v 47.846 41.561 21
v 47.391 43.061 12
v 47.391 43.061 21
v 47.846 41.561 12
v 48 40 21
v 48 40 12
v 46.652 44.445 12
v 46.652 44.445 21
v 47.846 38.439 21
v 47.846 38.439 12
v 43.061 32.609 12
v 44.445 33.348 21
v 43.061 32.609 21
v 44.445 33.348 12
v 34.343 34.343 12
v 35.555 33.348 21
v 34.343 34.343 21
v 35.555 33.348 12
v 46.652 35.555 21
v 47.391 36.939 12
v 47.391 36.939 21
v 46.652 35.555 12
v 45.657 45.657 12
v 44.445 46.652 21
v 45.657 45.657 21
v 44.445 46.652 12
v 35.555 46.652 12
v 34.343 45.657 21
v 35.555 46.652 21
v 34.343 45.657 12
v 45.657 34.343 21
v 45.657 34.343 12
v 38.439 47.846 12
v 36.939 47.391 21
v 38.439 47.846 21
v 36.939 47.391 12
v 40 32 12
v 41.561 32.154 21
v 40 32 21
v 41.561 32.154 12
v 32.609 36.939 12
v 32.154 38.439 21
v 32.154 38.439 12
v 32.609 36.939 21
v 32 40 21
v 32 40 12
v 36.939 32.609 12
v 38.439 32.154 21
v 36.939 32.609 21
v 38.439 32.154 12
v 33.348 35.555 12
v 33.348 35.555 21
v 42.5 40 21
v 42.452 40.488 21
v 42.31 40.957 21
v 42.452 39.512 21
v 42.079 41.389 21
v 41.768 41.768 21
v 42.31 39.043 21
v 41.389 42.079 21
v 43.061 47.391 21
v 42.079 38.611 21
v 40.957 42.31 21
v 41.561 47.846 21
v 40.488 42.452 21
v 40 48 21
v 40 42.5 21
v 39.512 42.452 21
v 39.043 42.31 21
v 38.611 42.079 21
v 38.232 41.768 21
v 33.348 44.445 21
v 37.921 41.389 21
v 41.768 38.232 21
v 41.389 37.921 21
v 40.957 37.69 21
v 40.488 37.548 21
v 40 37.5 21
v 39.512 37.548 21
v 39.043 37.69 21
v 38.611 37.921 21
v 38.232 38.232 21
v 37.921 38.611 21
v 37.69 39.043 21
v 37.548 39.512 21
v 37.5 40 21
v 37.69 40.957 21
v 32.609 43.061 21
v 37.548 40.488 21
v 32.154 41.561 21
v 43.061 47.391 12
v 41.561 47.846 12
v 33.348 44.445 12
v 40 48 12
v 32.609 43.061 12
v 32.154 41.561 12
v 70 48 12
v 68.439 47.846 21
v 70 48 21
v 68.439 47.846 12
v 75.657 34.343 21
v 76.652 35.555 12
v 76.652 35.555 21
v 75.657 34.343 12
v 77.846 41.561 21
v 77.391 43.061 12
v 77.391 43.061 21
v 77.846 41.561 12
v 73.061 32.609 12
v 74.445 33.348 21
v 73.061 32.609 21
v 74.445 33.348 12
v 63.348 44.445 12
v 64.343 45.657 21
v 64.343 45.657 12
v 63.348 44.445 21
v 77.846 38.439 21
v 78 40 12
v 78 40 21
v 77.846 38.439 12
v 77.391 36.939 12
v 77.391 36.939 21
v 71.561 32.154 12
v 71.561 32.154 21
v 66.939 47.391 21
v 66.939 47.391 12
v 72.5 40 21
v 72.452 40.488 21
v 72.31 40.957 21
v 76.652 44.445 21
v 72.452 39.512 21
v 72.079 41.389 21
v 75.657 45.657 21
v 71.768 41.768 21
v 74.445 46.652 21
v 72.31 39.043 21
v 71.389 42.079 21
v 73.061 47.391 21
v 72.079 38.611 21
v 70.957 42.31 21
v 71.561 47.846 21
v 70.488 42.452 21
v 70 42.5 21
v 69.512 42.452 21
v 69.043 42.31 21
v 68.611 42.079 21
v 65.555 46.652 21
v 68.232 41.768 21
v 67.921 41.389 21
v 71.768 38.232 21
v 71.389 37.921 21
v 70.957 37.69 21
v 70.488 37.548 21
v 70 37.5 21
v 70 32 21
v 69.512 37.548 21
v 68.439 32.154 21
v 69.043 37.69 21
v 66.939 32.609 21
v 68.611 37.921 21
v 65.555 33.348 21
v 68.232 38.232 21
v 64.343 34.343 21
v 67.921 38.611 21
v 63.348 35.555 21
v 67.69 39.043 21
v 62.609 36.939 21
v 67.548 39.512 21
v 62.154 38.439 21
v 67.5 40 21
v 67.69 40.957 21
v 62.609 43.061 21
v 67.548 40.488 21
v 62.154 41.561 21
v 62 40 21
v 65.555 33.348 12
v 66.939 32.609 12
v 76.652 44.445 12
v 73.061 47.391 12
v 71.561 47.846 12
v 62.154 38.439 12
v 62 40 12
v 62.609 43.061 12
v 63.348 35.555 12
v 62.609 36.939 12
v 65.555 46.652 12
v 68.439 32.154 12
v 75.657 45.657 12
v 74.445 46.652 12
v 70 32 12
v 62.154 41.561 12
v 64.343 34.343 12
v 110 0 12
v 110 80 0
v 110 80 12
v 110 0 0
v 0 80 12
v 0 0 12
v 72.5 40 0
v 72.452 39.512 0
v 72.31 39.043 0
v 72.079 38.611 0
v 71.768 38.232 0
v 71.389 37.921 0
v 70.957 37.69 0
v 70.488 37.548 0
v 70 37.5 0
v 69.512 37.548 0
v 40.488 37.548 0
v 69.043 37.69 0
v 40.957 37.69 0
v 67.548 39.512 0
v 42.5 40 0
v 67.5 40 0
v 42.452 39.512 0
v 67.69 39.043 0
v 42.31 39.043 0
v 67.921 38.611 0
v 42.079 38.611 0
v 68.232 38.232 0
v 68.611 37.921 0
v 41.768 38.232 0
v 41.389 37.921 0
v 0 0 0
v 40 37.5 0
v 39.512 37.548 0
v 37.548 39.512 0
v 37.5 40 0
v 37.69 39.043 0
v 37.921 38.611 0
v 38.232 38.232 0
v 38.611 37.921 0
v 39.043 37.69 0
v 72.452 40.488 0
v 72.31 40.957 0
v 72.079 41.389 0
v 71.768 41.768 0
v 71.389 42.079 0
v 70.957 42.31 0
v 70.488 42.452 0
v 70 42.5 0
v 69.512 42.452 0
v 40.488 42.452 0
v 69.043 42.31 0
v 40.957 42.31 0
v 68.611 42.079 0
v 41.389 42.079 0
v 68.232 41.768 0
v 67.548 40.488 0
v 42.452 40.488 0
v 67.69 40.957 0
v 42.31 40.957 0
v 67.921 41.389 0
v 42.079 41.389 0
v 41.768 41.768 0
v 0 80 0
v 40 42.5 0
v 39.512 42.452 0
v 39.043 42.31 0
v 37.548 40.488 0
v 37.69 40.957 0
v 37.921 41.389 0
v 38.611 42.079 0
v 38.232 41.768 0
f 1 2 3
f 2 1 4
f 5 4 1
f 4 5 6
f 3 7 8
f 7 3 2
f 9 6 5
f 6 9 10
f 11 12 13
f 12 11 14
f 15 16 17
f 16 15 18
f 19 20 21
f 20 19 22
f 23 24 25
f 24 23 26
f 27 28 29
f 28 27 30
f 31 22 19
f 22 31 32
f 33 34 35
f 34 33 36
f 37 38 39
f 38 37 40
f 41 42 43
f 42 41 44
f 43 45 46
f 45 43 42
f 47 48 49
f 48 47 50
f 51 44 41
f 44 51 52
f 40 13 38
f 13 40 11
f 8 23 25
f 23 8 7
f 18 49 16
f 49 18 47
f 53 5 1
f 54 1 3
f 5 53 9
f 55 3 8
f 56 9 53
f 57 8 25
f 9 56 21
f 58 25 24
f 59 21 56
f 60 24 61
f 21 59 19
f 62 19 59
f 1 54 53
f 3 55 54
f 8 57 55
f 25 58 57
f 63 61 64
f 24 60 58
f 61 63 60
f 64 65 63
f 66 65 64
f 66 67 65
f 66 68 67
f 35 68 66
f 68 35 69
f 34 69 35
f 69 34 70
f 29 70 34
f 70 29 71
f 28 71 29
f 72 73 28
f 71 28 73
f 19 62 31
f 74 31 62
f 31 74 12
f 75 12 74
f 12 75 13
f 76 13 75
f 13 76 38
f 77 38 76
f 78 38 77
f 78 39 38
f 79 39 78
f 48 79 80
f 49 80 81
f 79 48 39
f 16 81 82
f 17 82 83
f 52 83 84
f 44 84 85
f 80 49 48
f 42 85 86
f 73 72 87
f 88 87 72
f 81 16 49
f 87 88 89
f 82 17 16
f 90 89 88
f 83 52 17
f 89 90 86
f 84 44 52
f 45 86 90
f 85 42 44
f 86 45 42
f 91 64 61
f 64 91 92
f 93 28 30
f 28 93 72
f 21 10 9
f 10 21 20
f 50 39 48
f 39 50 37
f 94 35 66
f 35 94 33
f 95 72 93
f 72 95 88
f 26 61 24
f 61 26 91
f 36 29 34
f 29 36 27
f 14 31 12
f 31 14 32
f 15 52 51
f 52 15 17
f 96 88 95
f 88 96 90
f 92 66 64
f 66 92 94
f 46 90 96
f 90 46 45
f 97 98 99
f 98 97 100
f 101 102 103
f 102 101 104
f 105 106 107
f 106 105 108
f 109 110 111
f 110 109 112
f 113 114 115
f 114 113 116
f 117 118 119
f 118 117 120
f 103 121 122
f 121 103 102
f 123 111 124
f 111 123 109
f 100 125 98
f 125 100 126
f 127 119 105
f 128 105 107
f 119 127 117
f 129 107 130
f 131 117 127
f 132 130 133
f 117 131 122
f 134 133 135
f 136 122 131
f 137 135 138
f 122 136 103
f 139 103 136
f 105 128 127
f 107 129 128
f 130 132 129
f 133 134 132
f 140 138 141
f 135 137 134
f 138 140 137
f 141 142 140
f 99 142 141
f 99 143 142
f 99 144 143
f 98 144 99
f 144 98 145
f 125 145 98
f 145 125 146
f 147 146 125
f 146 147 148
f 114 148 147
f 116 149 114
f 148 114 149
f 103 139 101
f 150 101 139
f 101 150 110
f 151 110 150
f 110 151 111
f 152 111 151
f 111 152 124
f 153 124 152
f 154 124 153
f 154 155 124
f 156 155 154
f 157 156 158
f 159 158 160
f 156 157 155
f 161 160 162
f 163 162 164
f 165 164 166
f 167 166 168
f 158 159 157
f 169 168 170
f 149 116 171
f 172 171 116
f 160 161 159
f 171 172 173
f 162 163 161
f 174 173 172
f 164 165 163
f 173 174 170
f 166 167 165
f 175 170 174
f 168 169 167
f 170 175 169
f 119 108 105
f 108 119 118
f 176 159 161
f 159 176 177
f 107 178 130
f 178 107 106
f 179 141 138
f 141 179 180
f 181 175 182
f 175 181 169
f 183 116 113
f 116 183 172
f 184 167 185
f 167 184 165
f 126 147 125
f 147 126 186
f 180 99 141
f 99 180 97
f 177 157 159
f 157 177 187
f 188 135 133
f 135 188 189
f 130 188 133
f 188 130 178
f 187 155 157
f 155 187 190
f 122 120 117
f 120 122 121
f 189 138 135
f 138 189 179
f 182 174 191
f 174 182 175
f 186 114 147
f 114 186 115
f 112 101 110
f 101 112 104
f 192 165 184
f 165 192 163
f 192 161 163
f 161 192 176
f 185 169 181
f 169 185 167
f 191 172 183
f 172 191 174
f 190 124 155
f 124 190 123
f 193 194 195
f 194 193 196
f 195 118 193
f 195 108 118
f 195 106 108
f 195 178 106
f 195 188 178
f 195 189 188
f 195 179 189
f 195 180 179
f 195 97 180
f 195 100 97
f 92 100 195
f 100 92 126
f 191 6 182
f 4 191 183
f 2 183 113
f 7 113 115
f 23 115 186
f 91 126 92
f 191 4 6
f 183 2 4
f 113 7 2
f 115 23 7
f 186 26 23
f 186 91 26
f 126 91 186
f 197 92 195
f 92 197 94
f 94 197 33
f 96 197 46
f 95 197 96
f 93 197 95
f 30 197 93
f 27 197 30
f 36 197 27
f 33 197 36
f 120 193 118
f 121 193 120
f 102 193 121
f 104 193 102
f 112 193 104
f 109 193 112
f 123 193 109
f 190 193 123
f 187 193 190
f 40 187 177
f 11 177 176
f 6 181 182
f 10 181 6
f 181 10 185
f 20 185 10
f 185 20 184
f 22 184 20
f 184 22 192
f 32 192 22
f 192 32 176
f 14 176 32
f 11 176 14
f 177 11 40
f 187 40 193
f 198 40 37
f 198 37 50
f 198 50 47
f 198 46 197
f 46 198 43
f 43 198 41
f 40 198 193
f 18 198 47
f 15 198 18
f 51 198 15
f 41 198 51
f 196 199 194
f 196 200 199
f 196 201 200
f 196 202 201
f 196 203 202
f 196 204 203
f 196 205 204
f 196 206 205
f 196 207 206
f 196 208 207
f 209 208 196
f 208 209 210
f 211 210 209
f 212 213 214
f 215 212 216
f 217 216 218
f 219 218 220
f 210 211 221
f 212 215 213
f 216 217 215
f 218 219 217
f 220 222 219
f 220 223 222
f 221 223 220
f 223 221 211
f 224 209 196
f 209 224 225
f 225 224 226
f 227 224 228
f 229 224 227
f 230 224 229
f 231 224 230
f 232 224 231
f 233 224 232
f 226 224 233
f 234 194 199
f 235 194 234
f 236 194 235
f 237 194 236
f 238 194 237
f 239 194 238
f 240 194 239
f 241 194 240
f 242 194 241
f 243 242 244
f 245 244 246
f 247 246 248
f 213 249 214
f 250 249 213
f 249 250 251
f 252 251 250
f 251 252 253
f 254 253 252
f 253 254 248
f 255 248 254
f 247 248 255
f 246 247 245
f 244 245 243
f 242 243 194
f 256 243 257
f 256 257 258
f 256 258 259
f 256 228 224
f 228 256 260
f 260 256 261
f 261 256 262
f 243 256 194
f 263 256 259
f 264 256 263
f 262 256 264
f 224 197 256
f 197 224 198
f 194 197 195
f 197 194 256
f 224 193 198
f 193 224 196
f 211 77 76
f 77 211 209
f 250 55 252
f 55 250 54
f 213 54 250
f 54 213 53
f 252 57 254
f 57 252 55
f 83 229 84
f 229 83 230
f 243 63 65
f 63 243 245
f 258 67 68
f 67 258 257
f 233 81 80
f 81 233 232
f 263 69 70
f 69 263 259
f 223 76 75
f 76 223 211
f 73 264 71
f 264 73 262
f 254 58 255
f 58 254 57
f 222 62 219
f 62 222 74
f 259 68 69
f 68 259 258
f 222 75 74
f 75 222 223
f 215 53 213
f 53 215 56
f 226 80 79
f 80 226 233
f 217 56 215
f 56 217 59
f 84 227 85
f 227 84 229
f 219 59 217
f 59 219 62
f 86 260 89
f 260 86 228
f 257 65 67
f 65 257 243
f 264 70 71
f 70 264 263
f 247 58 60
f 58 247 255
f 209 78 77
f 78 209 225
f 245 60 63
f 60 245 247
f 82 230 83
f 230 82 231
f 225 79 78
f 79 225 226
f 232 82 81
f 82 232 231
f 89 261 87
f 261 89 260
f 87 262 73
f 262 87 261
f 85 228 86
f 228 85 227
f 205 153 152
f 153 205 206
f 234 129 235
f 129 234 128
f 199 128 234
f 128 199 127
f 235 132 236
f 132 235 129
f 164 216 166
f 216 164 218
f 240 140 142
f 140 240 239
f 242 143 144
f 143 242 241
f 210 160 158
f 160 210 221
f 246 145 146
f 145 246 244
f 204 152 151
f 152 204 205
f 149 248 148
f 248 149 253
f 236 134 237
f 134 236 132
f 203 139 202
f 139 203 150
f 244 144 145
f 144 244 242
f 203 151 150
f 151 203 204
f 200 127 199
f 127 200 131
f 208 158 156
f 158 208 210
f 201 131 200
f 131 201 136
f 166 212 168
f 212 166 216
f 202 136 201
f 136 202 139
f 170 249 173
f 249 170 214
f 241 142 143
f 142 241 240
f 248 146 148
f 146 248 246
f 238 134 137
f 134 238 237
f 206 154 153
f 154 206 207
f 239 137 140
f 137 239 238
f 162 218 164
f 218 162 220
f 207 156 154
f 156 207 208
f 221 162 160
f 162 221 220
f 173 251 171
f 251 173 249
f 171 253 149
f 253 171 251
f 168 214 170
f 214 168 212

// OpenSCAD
$fn = 32;

// ----------------------------------------------------------------------
// Drill jig: two_boss jig
// ----------------------------------------------------------------------

// --- parameters (mm) ---
plate_l = 110;            // plate length, X
plate_w = 80;             // plate width, Y
plate_t = 12;             // plate thickness
boss_d = 16;              // guide boss diameter
boss_h = 10;              // boss height above the plate
guide_d = 5;              // guide hole diameter
boss_pitch = 30;          // boss pitch

n_boss = 2;  // guide bosses
boss_x0 = (plate_l - (n_boss - 1) * boss_pitch) / 2;  // first boss X
boss_top = plate_t - 1 + boss_h;  // boss crown height
total_h = boss_top;  // overall height

difference() {
  union() {
  cube([plate_l, plate_w, plate_t]);
  for (i = [0 : n_boss - 1])
    translate([boss_x0 + i * boss_pitch, plate_w / 2, plate_t - 1])
      cylinder(h = boss_h, d = boss_d);
  }
  for (i = [0 : n_boss - 1])
    translate([boss_x0 + i * boss_pitch, plate_w / 2, -1])
      cylinder(h = plate_t + boss_h, d = guide_d);
}
